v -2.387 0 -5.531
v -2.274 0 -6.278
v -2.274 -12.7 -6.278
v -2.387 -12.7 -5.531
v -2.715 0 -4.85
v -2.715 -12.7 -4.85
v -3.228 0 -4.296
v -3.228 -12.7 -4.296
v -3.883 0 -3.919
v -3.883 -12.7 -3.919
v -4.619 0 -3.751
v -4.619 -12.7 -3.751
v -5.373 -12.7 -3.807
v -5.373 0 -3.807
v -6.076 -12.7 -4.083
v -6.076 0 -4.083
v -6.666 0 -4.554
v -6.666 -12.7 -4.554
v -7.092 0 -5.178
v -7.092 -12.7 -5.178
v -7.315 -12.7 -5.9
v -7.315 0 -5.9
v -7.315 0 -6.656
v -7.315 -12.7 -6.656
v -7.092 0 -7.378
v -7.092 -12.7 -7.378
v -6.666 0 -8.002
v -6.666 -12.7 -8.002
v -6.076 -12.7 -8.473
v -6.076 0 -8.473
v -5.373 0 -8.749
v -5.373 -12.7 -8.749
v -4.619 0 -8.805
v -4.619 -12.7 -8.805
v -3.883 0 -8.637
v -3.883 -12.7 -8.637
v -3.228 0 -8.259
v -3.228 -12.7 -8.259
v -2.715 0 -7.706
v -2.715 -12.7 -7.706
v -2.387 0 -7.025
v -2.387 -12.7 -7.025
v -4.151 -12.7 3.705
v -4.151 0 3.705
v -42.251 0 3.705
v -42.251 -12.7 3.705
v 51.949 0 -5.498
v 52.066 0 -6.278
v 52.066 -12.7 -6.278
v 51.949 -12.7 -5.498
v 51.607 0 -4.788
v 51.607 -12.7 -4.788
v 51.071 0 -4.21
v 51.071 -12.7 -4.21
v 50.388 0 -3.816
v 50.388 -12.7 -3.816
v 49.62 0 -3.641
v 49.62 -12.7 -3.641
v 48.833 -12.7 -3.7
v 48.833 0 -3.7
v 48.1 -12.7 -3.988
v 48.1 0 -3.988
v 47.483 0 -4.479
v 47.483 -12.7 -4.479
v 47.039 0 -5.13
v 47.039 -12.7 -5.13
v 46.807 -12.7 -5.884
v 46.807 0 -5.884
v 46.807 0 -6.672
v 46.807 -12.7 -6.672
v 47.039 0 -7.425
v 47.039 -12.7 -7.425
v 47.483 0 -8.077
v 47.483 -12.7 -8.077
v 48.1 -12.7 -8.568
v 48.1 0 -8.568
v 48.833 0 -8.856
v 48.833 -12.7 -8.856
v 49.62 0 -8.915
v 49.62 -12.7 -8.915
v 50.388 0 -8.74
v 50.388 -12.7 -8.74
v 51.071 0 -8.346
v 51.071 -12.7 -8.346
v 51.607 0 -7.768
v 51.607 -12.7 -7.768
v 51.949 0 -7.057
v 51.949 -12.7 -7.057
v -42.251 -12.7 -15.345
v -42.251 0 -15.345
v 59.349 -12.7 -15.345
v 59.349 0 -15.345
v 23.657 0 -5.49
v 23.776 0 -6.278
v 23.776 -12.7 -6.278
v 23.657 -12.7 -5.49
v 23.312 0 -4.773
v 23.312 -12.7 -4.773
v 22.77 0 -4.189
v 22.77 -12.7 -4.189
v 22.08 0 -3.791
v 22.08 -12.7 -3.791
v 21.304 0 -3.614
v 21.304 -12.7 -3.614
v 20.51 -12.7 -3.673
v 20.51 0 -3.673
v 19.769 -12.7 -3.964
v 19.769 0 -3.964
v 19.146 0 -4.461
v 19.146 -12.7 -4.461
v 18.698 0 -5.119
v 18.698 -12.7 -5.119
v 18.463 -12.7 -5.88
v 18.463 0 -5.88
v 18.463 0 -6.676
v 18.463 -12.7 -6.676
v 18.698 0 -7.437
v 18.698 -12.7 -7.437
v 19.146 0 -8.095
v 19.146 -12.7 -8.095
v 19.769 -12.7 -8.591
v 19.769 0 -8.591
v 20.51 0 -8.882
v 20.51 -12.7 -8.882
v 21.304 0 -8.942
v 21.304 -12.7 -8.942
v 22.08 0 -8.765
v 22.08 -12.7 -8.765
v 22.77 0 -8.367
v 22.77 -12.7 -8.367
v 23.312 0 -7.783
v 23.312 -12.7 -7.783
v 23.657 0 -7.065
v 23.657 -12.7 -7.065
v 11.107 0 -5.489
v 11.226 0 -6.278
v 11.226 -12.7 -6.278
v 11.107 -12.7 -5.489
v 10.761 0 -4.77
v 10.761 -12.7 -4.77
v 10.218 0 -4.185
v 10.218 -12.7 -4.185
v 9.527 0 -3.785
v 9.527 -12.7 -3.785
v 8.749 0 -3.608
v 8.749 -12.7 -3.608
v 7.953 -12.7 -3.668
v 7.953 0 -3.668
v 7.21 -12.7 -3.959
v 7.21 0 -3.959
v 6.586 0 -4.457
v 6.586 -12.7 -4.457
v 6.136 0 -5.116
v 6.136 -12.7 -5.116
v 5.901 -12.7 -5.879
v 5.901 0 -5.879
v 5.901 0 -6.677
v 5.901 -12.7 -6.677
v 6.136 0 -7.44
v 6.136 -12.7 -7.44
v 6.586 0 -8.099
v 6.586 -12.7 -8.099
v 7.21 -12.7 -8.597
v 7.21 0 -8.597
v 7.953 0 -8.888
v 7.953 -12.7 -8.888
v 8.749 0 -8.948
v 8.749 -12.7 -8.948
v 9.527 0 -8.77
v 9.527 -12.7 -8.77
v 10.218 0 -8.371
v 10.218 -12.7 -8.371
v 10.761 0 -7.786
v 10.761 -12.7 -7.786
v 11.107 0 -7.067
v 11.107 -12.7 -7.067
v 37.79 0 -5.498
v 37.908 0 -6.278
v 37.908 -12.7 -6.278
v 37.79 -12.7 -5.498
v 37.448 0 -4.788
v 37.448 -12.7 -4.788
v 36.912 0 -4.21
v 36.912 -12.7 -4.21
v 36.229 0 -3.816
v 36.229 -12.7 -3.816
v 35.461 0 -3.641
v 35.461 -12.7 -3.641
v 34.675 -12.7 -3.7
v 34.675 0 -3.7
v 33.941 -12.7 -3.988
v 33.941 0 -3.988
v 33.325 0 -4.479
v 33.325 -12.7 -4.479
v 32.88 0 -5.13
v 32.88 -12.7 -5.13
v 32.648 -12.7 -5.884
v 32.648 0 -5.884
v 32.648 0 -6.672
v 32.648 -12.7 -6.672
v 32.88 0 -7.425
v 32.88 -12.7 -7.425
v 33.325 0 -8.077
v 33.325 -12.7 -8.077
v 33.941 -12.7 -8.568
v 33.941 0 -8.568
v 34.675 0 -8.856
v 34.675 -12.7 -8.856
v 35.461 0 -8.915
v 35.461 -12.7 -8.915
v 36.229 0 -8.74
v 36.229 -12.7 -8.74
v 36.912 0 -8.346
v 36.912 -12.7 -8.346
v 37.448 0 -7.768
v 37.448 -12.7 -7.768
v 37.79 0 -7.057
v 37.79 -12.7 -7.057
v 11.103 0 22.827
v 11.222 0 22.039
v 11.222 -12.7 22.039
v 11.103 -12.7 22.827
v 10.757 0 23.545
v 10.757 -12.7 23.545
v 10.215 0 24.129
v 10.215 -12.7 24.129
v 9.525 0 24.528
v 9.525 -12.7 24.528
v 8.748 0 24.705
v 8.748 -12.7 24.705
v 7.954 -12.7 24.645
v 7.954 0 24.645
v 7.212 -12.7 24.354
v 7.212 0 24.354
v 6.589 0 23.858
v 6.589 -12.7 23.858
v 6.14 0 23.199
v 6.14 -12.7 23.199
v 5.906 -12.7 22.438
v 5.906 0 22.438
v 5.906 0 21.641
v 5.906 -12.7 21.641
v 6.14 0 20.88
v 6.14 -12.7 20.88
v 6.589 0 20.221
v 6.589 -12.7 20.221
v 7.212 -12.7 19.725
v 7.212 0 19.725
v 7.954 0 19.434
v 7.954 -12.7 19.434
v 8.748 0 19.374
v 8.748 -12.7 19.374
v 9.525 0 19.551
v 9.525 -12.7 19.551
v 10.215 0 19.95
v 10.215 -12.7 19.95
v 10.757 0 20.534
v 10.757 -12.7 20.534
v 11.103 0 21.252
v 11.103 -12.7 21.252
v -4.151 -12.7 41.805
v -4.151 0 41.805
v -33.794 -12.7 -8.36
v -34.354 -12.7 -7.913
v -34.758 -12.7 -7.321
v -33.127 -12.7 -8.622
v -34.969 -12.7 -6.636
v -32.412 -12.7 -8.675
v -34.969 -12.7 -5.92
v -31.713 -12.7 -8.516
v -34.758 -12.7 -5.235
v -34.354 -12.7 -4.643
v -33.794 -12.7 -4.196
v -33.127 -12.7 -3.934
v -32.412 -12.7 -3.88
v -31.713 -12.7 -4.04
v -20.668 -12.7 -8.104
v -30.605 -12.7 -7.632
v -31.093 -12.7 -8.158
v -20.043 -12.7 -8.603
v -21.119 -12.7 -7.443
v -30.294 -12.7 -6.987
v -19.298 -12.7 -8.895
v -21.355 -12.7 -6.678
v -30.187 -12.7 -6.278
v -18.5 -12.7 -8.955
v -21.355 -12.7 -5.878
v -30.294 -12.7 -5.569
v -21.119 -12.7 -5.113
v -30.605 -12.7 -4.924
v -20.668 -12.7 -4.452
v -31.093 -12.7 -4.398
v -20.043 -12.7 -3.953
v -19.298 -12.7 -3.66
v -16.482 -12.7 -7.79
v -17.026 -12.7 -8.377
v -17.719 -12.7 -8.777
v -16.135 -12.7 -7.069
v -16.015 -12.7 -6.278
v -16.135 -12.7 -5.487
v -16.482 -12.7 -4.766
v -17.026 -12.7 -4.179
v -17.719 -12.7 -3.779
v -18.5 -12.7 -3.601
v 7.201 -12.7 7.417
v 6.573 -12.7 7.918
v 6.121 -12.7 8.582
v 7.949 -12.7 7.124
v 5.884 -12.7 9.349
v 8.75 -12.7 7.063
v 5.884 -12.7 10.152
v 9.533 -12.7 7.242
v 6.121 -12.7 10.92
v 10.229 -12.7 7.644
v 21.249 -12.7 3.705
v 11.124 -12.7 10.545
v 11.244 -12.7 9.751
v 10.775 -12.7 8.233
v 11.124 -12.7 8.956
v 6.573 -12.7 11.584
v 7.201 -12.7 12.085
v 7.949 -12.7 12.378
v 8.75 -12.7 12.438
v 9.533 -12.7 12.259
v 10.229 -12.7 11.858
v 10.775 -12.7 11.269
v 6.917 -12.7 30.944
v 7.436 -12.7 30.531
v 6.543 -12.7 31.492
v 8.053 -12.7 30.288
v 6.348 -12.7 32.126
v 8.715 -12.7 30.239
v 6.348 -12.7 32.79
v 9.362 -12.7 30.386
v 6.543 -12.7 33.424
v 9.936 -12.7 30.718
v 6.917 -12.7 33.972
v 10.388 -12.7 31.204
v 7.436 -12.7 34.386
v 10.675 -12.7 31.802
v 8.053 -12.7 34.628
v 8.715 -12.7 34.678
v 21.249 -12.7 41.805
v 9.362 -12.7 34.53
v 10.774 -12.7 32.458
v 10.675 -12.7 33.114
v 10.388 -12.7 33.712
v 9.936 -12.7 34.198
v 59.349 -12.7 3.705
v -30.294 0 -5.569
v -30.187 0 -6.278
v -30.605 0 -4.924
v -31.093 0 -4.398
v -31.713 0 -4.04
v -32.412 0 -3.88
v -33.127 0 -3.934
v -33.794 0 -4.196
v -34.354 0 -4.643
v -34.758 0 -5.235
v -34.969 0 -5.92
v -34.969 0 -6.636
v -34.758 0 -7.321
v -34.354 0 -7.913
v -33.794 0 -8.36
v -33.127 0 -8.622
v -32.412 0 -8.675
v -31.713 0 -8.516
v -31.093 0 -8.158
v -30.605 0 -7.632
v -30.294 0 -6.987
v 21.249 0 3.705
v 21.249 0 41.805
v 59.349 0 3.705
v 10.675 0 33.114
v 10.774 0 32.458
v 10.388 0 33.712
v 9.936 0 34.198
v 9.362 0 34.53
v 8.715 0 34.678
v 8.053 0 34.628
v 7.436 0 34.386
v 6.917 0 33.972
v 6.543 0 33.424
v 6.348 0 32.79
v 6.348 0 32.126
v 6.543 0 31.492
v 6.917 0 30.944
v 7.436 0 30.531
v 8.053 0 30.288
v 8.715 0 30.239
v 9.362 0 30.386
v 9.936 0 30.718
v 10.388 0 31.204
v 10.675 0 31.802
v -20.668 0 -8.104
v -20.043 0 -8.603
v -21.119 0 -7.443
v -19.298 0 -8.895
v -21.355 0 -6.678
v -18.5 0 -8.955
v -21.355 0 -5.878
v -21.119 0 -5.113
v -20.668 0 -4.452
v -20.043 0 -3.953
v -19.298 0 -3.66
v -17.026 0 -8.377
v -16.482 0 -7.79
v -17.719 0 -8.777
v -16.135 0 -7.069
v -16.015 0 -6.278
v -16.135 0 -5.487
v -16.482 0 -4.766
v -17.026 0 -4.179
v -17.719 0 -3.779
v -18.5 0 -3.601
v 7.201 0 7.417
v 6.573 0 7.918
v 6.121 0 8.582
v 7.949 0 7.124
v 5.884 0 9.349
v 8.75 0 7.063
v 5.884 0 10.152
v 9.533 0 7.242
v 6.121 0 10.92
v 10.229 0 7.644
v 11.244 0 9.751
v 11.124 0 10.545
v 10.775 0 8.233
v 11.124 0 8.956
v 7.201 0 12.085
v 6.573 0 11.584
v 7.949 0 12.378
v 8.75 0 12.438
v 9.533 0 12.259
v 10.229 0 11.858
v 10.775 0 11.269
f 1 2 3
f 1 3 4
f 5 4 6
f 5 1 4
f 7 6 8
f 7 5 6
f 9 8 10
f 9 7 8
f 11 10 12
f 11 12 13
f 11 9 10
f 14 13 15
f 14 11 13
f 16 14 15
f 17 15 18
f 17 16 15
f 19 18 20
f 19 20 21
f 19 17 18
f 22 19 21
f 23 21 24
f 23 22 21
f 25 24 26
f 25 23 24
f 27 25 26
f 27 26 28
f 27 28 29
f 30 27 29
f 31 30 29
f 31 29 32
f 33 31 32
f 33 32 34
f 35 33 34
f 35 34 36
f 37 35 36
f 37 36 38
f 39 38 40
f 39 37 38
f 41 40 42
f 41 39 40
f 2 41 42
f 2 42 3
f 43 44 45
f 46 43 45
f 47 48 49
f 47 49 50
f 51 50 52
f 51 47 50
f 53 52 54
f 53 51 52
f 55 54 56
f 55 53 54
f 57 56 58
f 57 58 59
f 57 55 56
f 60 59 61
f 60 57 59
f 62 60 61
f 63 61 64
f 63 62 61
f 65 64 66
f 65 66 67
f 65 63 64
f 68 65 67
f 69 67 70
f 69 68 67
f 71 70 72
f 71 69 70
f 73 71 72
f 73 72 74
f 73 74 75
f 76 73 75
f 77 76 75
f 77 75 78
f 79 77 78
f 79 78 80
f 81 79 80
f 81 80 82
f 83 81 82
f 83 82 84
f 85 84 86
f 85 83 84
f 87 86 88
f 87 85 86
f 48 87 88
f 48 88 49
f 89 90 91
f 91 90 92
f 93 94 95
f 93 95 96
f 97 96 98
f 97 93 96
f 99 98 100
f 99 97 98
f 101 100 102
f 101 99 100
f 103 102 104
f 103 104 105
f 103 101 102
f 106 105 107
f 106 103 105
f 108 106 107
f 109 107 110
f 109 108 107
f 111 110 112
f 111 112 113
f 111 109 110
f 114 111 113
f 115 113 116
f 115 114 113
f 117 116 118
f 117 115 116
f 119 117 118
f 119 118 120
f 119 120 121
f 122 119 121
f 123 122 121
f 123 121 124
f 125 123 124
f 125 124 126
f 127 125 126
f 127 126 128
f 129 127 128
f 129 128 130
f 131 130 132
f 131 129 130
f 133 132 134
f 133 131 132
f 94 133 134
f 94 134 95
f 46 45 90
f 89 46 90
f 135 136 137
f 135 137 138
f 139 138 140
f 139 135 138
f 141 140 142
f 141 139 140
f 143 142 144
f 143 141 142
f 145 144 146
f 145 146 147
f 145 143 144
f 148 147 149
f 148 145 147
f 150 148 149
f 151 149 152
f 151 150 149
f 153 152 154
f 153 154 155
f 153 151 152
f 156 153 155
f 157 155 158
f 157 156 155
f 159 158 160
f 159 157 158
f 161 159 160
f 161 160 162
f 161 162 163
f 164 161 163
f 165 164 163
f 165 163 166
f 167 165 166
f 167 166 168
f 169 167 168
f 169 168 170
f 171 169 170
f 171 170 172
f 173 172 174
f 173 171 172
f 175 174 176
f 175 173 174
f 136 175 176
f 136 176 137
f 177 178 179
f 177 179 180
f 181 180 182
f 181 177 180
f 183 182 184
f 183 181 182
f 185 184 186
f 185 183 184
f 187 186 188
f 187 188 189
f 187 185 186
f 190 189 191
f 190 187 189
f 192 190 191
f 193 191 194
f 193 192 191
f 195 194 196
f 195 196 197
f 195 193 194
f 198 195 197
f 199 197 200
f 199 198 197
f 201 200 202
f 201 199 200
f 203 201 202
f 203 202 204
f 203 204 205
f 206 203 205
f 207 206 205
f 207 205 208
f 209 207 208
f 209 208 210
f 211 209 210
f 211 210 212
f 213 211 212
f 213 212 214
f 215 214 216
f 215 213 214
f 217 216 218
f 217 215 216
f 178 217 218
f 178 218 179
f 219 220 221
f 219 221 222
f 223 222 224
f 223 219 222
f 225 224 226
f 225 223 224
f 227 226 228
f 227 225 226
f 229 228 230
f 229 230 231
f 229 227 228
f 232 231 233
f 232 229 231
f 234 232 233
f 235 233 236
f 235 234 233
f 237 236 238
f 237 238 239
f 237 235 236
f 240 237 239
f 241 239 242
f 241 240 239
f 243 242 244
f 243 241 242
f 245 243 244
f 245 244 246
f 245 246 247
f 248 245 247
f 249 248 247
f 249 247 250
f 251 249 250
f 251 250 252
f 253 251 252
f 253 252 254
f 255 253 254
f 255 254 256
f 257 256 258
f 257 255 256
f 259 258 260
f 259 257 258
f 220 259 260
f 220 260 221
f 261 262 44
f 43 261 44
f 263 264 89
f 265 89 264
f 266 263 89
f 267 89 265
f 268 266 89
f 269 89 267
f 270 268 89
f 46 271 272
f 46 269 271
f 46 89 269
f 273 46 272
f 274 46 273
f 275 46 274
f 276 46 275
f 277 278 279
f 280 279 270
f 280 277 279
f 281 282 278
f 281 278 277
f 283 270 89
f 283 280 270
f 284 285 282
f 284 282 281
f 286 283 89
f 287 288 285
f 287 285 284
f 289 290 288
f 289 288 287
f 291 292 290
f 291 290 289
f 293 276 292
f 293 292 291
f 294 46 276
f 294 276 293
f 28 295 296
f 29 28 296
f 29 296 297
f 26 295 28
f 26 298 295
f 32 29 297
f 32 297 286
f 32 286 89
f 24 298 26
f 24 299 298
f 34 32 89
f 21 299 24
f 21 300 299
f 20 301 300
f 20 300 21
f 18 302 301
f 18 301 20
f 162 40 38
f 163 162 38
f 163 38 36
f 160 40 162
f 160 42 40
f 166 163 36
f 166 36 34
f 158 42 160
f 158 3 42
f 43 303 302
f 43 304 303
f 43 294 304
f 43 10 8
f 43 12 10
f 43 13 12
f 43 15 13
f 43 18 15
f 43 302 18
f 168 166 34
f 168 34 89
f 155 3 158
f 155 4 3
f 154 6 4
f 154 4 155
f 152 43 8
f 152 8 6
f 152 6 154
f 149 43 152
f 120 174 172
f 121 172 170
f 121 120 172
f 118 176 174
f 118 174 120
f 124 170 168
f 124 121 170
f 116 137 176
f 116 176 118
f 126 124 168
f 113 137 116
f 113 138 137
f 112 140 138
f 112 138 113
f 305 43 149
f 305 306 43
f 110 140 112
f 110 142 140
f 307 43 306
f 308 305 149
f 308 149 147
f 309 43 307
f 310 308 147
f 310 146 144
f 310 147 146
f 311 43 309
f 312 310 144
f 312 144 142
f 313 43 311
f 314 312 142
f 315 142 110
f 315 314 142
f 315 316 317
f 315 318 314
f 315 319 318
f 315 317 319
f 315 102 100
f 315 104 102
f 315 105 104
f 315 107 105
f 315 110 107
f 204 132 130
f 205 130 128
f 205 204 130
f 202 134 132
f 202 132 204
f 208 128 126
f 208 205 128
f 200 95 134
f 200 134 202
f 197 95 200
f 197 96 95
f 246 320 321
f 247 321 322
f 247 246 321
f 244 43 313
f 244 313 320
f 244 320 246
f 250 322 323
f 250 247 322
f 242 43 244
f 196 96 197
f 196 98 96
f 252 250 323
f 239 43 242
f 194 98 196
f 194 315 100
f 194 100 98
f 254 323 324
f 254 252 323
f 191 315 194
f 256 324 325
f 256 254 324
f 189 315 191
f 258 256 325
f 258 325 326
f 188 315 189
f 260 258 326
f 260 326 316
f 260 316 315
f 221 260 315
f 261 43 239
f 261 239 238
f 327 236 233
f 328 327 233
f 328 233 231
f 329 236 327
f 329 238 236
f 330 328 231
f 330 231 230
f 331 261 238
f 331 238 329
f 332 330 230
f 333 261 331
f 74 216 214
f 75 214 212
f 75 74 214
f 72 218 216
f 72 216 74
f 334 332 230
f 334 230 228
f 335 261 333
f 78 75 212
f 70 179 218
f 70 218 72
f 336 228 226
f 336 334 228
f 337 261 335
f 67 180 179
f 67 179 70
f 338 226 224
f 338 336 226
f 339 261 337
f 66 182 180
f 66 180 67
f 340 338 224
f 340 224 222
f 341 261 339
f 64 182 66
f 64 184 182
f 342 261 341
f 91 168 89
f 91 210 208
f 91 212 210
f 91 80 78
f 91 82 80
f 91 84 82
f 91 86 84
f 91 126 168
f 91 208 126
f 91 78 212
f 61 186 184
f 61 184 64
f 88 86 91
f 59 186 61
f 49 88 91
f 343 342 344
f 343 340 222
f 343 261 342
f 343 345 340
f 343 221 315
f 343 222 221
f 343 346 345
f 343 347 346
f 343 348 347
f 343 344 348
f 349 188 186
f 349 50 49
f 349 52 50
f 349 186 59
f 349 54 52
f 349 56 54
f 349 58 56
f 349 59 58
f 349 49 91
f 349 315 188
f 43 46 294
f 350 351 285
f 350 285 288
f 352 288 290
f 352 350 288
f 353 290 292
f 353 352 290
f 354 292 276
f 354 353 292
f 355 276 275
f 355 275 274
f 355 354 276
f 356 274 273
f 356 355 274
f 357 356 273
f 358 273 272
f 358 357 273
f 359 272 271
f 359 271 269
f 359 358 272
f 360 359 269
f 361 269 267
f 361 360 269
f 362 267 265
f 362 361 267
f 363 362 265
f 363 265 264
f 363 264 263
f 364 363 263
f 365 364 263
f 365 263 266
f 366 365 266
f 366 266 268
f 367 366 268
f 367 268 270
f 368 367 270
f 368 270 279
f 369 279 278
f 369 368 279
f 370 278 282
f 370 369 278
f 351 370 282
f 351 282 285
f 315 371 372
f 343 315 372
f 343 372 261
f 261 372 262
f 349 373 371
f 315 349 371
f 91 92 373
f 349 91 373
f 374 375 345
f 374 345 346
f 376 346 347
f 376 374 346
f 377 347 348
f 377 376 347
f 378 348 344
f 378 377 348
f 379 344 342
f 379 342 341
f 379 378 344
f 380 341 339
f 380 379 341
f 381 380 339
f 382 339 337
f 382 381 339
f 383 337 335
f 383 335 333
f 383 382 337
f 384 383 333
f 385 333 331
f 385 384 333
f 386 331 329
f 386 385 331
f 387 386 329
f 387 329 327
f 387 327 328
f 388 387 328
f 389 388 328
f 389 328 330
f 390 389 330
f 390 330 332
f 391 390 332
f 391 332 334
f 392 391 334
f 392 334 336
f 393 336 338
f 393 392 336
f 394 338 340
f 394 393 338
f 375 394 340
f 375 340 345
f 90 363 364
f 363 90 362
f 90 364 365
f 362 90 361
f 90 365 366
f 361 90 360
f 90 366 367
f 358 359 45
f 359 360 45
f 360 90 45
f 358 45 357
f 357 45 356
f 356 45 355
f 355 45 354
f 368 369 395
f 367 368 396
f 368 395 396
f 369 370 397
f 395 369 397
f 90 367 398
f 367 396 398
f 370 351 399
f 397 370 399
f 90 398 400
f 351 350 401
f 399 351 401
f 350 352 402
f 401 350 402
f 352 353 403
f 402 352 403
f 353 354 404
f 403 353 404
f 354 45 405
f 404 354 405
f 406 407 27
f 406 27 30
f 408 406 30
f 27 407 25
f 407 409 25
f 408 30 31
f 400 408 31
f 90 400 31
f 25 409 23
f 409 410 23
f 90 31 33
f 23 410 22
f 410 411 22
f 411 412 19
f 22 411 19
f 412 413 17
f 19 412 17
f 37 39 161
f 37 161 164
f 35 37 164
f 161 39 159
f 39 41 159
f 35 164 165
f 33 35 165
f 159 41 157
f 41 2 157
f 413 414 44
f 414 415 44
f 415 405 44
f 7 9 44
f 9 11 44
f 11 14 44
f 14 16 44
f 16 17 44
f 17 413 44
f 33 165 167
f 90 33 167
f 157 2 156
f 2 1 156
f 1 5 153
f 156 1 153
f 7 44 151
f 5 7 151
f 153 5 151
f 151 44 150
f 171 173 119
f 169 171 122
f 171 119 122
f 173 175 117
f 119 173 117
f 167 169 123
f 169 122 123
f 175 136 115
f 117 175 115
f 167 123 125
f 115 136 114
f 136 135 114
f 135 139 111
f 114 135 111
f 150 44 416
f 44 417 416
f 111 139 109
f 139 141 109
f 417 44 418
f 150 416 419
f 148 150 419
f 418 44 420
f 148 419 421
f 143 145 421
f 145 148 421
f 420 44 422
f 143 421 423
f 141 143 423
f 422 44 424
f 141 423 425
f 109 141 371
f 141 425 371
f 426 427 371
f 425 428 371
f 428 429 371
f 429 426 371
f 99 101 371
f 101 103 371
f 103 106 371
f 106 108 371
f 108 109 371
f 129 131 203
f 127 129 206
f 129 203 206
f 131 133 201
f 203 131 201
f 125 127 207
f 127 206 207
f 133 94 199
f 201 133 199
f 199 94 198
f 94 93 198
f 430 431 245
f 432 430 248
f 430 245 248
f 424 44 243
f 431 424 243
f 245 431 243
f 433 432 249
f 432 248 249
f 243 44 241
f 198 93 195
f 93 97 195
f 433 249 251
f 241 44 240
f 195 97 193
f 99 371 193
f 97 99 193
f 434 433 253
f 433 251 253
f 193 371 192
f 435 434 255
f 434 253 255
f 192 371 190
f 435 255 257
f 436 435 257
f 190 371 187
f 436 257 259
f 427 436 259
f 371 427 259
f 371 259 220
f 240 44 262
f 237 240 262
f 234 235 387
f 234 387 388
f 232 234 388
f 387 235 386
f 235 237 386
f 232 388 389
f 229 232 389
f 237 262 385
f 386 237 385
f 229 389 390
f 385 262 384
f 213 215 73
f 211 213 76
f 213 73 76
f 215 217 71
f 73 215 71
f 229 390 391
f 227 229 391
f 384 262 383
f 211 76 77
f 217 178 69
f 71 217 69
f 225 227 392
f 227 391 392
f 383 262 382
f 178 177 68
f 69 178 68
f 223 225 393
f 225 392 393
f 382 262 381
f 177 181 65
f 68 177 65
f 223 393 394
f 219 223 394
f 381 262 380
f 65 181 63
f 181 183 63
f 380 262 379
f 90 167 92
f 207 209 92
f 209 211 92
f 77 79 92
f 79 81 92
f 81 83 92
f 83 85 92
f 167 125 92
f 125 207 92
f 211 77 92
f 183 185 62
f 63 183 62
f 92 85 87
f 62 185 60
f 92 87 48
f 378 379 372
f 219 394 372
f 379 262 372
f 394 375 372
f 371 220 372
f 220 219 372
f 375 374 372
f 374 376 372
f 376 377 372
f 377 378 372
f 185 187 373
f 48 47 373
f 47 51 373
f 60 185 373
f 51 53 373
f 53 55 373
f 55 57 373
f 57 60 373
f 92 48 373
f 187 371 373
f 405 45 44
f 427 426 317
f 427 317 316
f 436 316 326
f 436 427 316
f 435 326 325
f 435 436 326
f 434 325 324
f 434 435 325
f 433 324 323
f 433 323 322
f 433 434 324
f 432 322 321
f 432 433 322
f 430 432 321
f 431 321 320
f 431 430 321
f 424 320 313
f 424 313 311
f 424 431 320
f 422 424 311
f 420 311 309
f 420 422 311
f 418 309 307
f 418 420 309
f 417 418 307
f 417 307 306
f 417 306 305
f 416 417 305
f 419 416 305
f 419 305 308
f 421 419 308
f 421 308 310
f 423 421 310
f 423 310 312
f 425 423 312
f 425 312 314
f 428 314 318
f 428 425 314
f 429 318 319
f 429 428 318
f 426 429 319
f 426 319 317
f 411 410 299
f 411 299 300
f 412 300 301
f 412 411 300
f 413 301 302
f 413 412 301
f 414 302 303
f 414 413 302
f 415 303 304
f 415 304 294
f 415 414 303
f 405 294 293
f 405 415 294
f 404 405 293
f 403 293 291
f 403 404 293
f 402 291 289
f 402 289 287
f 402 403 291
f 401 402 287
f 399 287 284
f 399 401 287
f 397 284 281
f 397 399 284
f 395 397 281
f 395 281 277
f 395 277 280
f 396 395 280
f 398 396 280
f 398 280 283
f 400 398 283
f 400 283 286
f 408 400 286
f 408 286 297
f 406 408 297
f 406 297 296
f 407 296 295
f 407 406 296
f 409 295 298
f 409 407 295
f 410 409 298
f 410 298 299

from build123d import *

# Parameters (mm, degrees)
F0_R     = 2.404306
F0_R_2   = 2.684776
F0_R_3   = 2.53436
F0_R_4   = 2.677502
F0_R_5   = 2.694859
F0_R_6   = 2.671458
F0_R_7   = 2.644601
F0_R_8   = 2.644603
F0_R_9   = 2.672879
F0_R_10  = 2.225712
F1_DEPTH = 12.7


with BuildPart() as f1:
    # F0 (on Front) → F1 (new body)
    with BuildSketch(Plane.XZ):
        Polygon((-42.251352, -15.345026), (59.348648, -15.345026), (59.348648, 3.704974), (21.248648, 3.704974), (21.248648, 41.804974), (-4.151352, 41.804974), (-4.151352, 3.704974), (-42.251352, 3.704974), align=None)
        with Locations((-32.591719, -6.277913)):
            Circle(F0_R, mode=Mode.SUBTRACT)
        with Locations((-18.700166, -6.277913)):
            Circle(F0_R_2, mode=Mode.SUBTRACT)
        with Locations((-4.808613, -6.277913)):
            Circle(F0_R_3, mode=Mode.SUBTRACT)
        with Locations((8.548648, -6.277913)):
            Circle(F0_R_4, mode=Mode.SUBTRACT)
        with Locations((8.548648, 9.750801)):
            Circle(F0_R_5, mode=Mode.SUBTRACT)
        with Locations((21.104472, -6.277913)):
            Circle(F0_R_6, mode=Mode.SUBTRACT)
        with Locations((35.26317, -6.277913)):
            Circle(F0_R_7, mode=Mode.SUBTRACT)
        with Locations((49.421869, -6.277913)):
            Circle(F0_R_8, mode=Mode.SUBTRACT)
        with Locations((8.548648, 22.039484)):
            Circle(F0_R_9, mode=Mode.SUBTRACT)
        with Locations((8.548648, 32.458149)):
            Circle(F0_R_10, mode=Mode.SUBTRACT)
    extrude(amount=F1_DEPTH)


solid = f1.part
